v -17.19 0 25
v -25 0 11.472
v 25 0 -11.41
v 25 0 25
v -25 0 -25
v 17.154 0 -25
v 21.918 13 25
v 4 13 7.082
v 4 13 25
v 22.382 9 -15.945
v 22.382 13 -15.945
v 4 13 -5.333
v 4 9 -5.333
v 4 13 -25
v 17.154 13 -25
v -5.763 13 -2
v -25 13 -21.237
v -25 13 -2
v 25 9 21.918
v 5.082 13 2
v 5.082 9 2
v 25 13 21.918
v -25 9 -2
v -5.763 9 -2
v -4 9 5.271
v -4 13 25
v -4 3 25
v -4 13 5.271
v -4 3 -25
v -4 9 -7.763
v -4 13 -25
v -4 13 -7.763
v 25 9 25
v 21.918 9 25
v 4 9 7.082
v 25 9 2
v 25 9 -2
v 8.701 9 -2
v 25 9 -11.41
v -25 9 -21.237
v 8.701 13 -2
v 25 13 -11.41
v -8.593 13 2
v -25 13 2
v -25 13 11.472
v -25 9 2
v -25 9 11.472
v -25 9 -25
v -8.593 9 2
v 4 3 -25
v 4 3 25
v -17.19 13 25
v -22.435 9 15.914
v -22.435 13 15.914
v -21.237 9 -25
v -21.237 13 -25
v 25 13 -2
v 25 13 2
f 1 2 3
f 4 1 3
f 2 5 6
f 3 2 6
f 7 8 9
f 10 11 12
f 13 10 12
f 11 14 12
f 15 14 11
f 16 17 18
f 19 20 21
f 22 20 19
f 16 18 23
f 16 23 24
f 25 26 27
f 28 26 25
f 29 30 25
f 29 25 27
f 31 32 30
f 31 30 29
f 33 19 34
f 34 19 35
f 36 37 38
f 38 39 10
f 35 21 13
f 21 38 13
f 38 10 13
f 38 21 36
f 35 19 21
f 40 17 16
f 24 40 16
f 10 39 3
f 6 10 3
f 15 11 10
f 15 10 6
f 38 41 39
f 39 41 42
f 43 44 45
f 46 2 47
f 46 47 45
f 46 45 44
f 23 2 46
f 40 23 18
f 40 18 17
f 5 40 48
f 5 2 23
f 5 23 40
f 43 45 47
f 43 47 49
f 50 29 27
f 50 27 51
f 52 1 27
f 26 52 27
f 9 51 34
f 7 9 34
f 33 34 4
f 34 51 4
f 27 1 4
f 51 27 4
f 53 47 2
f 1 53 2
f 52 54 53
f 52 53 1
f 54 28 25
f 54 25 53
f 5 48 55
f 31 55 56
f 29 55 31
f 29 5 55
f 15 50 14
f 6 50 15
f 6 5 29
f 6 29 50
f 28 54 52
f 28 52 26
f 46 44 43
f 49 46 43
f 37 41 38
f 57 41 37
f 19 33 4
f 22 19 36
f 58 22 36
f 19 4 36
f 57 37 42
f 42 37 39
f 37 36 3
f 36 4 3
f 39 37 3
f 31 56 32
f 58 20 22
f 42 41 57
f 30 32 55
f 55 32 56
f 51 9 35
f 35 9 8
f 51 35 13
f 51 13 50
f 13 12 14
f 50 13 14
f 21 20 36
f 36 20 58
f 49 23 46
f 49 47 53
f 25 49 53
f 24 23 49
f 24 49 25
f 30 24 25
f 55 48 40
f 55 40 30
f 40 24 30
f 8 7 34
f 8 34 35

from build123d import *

# Parameters (mm, degrees)
SKETCH_2_W          = 50
SKETCH_2_H          = 50
EXTRUDE_1_DEPTH     = 13
SKETCH_3_W          = 8
SKETCH_3_H          = 50
CUT_EXTRUDE_1_DEPTH = 10
SKETCH_4_W          = 50
SKETCH_4_H          = 4
CUT_EXTRUDE_2_DEPTH = 4
CUT_EXTRUDE_4_DEPTH = 4
CUT_EXTRUDE_5_DEPTH = 4
CUT_EXTRUDE_6_DEPTH = 4
CUT_EXTRUDE_7_DEPTH = 4
CUT_EXTRUDE_8_DEPTH = 38.669616404


with BuildPart() as part:
    # 草图2 → 凸台-拉伸1 (new body)
    with BuildSketch(Plane(origin=(0, 0, 0), x_dir=(1, 0, 0), z_dir=(0, 1, 0))):
        Rectangle(SKETCH_2_W, SKETCH_2_H)
    extrude(amount=EXTRUDE_1_DEPTH)

    # 草图3 → 切除-拉伸1 (cut)
    with BuildSketch(Plane(origin=(0, 13, 0), x_dir=(1, 0, 0), z_dir=(0, 1, 0))):
        Rectangle(SKETCH_3_W, SKETCH_3_H)
    extrude(amount=-CUT_EXTRUDE_1_DEPTH, mode=Mode.SUBTRACT)

    # 草图4 → 切除-拉伸2 (cut)
    with BuildSketch(Plane(origin=(0, 13, 0), x_dir=(1, 0, 0), z_dir=(0, 1, 0))):
        Rectangle(SKETCH_4_W, SKETCH_4_H)
    extrude(amount=-CUT_EXTRUDE_2_DEPTH, mode=Mode.SUBTRACT)

    # 草图5 → 切除-拉伸4 (cut)
    with BuildSketch(Plane(origin=(0, 13, 0), x_dir=(1, 0, 0), z_dir=(0, 1, 0))):
        Polygon((-1.282274203, 2.220964068), (1.282274203, -2.220964068), (-26.199867727, -18.087786109), (-28.764416132, -13.645857973), align=None)
    extrude(amount=-CUT_EXTRUDE_4_DEPTH, mode=Mode.SUBTRACT)

    # 草图7 → 切除-拉伸5 (cut)
    with BuildSketch(Plane(origin=(0, 13, 0), x_dir=(1, 0, 0), z_dir=(0, 1, 0))):
        Polygon((-1.881421881, -1.881421881), (1.881421881, 1.881421881), (-24.724588242, 28.487432004), (-28.487432004, 24.724588242), align=None)
    extrude(amount=-CUT_EXTRUDE_5_DEPTH, mode=Mode.SUBTRACT)

    # 草图8 → 切除-拉伸6 (cut)
    with BuildSketch(Plane(origin=(0, 13, 0), x_dir=(1, 0, 0), z_dir=(0, 1, 0))):
        Polygon((-1.54081376, -1.54081376), (1.54081376, 1.54081376), (29.908508957, -26.826881437), (26.826881437, -29.908508957), align=None)
    extrude(amount=-CUT_EXTRUDE_6_DEPTH, mode=Mode.SUBTRACT)

    # 草图9 → 切除-拉伸7 (cut)
    with BuildSketch(Plane(origin=(0, 13, 0), x_dir=(1, 0, 0), z_dir=(0, 1, 0))):
        Polygon((-1.309113008, 2.267450243), (1.309113008, -2.267450243), (34.209084597, 16.72735721), (31.590858581, 21.262257696), align=None)
    extrude(amount=-CUT_EXTRUDE_7_DEPTH, mode=Mode.SUBTRACT)

    # 草图10 → 切除-拉伸8 (cut, through all)
    with BuildSketch(Plane(origin=(0, 13, 0), x_dir=(1, 0, 0), z_dir=(0, 1, 0))):
        Polygon((-25, -11.472471306), (-17.189877667, -25), (-25, -25), align=None)
        Polygon((25, 11.410489739), (17.154092593, 25), (25, 25), align=None)
    extrude(amount=-CUT_EXTRUDE_8_DEPTH, mode=Mode.SUBTRACT)


solid = part.part
